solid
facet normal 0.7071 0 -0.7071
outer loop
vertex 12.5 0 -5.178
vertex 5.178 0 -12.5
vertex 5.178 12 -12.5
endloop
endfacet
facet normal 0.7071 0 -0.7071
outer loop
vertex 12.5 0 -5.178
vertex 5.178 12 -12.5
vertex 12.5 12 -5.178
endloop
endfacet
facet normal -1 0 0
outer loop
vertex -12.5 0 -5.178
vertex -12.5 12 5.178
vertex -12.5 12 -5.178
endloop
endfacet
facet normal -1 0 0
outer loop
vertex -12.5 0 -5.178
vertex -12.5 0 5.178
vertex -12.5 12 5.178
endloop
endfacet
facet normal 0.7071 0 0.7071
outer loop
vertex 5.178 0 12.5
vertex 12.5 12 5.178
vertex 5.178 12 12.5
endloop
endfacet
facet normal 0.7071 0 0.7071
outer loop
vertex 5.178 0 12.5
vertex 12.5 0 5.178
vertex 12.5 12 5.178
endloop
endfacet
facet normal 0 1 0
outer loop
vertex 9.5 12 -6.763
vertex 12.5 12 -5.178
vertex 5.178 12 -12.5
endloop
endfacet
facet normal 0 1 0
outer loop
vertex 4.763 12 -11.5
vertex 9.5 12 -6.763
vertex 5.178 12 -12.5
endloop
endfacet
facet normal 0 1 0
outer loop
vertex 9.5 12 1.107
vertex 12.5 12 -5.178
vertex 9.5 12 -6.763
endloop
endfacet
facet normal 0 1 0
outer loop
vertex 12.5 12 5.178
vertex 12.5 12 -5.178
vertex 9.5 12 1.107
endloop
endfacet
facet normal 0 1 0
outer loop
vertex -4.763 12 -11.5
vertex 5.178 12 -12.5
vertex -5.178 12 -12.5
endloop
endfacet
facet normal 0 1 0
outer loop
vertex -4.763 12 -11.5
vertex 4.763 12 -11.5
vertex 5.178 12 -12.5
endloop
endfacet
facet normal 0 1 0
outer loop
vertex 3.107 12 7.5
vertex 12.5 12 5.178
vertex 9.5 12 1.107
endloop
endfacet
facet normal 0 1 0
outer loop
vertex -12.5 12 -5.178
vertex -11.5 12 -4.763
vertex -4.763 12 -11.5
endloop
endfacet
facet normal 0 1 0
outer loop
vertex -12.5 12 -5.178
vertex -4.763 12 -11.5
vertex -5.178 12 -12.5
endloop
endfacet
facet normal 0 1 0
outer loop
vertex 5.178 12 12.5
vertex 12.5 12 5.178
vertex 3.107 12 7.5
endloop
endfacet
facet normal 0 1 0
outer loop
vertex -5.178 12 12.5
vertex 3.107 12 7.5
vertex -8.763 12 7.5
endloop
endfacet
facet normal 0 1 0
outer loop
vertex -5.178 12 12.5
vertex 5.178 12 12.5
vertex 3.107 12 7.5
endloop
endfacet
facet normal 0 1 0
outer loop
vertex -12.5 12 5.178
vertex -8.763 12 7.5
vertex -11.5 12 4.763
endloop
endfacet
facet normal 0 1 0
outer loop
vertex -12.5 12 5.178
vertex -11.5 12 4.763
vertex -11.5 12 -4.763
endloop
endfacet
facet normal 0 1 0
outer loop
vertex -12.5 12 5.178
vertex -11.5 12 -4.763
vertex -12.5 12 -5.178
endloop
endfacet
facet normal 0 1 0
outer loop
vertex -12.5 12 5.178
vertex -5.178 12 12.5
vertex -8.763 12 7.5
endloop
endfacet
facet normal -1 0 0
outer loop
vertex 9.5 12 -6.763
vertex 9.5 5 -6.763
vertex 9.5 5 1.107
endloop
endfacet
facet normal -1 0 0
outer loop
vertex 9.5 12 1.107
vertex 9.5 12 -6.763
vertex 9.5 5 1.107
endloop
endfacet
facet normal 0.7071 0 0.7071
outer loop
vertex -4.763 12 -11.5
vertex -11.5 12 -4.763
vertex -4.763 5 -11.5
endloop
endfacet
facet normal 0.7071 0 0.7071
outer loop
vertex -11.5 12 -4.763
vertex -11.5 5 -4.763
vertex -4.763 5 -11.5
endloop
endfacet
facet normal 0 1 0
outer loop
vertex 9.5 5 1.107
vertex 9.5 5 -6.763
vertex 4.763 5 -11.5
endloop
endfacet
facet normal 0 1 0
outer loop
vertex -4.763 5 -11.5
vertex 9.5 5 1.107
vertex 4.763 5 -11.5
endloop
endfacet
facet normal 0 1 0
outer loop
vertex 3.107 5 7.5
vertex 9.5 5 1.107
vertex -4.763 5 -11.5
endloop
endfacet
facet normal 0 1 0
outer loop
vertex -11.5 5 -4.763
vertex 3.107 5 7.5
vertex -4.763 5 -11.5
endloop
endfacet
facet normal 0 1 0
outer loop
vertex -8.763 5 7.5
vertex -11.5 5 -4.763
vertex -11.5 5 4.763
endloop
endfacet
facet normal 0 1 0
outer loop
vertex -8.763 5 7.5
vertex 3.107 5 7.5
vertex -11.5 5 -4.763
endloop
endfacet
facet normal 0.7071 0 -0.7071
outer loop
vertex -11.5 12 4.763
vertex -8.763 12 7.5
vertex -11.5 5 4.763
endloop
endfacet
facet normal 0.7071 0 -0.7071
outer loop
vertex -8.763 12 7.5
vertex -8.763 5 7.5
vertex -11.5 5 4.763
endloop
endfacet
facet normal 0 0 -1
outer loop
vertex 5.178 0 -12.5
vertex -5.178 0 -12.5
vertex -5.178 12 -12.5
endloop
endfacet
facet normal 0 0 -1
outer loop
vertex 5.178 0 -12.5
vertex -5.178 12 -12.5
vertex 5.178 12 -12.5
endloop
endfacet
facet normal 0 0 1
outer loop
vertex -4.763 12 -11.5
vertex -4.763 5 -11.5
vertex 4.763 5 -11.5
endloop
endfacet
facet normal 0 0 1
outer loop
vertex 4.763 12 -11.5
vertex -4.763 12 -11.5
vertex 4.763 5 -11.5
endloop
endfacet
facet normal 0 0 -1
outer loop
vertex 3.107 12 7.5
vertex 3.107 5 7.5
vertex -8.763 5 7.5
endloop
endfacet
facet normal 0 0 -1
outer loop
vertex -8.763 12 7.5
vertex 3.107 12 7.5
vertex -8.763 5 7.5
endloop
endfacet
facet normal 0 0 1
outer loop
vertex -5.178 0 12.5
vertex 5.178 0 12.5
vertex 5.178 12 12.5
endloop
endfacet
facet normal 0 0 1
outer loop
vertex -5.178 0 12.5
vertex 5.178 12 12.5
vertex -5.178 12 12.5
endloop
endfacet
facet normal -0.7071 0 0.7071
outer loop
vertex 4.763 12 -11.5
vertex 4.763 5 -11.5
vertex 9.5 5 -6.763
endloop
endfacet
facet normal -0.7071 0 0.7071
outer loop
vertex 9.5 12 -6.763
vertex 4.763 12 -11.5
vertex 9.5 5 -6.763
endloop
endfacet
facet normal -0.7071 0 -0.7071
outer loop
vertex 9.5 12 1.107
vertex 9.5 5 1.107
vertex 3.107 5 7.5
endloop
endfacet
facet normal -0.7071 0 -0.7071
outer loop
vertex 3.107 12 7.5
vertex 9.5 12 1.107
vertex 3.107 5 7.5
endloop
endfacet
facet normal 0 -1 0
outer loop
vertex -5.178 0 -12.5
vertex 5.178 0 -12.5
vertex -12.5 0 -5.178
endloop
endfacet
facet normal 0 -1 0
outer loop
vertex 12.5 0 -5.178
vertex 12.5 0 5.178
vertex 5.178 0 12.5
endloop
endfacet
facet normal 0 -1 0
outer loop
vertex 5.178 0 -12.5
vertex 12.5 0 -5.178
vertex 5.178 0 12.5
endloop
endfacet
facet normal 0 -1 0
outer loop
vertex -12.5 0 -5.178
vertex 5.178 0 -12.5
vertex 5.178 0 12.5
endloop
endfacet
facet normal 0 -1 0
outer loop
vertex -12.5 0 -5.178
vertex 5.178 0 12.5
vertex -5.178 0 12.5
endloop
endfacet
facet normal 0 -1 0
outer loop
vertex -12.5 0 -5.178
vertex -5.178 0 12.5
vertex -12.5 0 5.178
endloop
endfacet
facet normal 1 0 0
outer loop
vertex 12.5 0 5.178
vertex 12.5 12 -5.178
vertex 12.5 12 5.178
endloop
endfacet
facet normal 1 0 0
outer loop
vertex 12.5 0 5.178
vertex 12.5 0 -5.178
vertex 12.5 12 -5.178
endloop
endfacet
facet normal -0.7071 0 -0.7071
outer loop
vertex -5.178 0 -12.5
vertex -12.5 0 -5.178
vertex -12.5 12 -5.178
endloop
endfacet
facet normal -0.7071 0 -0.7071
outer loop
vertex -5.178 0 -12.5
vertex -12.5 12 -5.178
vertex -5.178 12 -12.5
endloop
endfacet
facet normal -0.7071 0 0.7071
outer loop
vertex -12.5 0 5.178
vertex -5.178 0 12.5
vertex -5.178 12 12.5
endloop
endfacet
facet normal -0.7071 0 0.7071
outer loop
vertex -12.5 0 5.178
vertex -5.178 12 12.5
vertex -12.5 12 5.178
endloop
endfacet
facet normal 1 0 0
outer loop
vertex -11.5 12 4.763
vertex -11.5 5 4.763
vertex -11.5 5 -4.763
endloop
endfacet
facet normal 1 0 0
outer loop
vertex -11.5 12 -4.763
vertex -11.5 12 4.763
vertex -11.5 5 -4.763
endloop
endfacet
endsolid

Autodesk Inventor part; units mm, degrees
ref_plane "YZ Plane" through (0, 0, 0) normal (1, 0, 0) x (0, 1, 0)
ref_plane "XZ Plane" through (0, 0, 0) normal (0, 1, 0) x (-1, 0, 0)
ref_plane "XY Plane" through (0, 0, 0) normal (0, 0, 1) x (1, 0, 0)
sketch "草圖1" plane through (0, 0, 0) normal (0, 1, 0) x (-1, 0, 0)
  line L0 (-12.5, 5.1777) -> (-5.1777, 12.5)
  line L1 (-5.1777, 12.5) -> (5.1777, 12.5)
  line L2 (5.1777, 12.5) -> (12.5, 5.1777)
  line L3 (12.5, 5.1777) -> (12.5, -5.1777)
  line L4 (12.5, -5.1777) -> (5.1777, -12.5)
  line L5 (5.1777, -12.5) -> (-5.1777, -12.5)
  line L6 (-5.1777, -12.5) -> (-12.5, -5.1777)
  line L7 (-12.5, -5.1777) -> (-12.5, 5.1777)
  line L8 (123.9504, 0) -> (-90.7739, 0) construction
  point P0 (0, 0)
  point P1 (0, 0)
  dimension "d1" = 25
extrude "擠出1" add sketch "草圖1" along normal blind 12
shell "薄殼3" thickness 5 removed faces 1 at (-0.7149, 12, -1.7259) ; own thickness 5 on faces at (1.7259, 4, 12.5) (10.0592, 4, 7.6184) ; own thickness 3 on faces at (12.5, 4, -1.7259) ; own thickness 1 on faces at (-7.6184, 4, 10.0592) (-12.5, 4, 1.7259) (-10.0592, 4, -7.6184) (-1.7259, 4, -12.5) (7.6184, 4, -10.0592)
properties part number "示範一"
